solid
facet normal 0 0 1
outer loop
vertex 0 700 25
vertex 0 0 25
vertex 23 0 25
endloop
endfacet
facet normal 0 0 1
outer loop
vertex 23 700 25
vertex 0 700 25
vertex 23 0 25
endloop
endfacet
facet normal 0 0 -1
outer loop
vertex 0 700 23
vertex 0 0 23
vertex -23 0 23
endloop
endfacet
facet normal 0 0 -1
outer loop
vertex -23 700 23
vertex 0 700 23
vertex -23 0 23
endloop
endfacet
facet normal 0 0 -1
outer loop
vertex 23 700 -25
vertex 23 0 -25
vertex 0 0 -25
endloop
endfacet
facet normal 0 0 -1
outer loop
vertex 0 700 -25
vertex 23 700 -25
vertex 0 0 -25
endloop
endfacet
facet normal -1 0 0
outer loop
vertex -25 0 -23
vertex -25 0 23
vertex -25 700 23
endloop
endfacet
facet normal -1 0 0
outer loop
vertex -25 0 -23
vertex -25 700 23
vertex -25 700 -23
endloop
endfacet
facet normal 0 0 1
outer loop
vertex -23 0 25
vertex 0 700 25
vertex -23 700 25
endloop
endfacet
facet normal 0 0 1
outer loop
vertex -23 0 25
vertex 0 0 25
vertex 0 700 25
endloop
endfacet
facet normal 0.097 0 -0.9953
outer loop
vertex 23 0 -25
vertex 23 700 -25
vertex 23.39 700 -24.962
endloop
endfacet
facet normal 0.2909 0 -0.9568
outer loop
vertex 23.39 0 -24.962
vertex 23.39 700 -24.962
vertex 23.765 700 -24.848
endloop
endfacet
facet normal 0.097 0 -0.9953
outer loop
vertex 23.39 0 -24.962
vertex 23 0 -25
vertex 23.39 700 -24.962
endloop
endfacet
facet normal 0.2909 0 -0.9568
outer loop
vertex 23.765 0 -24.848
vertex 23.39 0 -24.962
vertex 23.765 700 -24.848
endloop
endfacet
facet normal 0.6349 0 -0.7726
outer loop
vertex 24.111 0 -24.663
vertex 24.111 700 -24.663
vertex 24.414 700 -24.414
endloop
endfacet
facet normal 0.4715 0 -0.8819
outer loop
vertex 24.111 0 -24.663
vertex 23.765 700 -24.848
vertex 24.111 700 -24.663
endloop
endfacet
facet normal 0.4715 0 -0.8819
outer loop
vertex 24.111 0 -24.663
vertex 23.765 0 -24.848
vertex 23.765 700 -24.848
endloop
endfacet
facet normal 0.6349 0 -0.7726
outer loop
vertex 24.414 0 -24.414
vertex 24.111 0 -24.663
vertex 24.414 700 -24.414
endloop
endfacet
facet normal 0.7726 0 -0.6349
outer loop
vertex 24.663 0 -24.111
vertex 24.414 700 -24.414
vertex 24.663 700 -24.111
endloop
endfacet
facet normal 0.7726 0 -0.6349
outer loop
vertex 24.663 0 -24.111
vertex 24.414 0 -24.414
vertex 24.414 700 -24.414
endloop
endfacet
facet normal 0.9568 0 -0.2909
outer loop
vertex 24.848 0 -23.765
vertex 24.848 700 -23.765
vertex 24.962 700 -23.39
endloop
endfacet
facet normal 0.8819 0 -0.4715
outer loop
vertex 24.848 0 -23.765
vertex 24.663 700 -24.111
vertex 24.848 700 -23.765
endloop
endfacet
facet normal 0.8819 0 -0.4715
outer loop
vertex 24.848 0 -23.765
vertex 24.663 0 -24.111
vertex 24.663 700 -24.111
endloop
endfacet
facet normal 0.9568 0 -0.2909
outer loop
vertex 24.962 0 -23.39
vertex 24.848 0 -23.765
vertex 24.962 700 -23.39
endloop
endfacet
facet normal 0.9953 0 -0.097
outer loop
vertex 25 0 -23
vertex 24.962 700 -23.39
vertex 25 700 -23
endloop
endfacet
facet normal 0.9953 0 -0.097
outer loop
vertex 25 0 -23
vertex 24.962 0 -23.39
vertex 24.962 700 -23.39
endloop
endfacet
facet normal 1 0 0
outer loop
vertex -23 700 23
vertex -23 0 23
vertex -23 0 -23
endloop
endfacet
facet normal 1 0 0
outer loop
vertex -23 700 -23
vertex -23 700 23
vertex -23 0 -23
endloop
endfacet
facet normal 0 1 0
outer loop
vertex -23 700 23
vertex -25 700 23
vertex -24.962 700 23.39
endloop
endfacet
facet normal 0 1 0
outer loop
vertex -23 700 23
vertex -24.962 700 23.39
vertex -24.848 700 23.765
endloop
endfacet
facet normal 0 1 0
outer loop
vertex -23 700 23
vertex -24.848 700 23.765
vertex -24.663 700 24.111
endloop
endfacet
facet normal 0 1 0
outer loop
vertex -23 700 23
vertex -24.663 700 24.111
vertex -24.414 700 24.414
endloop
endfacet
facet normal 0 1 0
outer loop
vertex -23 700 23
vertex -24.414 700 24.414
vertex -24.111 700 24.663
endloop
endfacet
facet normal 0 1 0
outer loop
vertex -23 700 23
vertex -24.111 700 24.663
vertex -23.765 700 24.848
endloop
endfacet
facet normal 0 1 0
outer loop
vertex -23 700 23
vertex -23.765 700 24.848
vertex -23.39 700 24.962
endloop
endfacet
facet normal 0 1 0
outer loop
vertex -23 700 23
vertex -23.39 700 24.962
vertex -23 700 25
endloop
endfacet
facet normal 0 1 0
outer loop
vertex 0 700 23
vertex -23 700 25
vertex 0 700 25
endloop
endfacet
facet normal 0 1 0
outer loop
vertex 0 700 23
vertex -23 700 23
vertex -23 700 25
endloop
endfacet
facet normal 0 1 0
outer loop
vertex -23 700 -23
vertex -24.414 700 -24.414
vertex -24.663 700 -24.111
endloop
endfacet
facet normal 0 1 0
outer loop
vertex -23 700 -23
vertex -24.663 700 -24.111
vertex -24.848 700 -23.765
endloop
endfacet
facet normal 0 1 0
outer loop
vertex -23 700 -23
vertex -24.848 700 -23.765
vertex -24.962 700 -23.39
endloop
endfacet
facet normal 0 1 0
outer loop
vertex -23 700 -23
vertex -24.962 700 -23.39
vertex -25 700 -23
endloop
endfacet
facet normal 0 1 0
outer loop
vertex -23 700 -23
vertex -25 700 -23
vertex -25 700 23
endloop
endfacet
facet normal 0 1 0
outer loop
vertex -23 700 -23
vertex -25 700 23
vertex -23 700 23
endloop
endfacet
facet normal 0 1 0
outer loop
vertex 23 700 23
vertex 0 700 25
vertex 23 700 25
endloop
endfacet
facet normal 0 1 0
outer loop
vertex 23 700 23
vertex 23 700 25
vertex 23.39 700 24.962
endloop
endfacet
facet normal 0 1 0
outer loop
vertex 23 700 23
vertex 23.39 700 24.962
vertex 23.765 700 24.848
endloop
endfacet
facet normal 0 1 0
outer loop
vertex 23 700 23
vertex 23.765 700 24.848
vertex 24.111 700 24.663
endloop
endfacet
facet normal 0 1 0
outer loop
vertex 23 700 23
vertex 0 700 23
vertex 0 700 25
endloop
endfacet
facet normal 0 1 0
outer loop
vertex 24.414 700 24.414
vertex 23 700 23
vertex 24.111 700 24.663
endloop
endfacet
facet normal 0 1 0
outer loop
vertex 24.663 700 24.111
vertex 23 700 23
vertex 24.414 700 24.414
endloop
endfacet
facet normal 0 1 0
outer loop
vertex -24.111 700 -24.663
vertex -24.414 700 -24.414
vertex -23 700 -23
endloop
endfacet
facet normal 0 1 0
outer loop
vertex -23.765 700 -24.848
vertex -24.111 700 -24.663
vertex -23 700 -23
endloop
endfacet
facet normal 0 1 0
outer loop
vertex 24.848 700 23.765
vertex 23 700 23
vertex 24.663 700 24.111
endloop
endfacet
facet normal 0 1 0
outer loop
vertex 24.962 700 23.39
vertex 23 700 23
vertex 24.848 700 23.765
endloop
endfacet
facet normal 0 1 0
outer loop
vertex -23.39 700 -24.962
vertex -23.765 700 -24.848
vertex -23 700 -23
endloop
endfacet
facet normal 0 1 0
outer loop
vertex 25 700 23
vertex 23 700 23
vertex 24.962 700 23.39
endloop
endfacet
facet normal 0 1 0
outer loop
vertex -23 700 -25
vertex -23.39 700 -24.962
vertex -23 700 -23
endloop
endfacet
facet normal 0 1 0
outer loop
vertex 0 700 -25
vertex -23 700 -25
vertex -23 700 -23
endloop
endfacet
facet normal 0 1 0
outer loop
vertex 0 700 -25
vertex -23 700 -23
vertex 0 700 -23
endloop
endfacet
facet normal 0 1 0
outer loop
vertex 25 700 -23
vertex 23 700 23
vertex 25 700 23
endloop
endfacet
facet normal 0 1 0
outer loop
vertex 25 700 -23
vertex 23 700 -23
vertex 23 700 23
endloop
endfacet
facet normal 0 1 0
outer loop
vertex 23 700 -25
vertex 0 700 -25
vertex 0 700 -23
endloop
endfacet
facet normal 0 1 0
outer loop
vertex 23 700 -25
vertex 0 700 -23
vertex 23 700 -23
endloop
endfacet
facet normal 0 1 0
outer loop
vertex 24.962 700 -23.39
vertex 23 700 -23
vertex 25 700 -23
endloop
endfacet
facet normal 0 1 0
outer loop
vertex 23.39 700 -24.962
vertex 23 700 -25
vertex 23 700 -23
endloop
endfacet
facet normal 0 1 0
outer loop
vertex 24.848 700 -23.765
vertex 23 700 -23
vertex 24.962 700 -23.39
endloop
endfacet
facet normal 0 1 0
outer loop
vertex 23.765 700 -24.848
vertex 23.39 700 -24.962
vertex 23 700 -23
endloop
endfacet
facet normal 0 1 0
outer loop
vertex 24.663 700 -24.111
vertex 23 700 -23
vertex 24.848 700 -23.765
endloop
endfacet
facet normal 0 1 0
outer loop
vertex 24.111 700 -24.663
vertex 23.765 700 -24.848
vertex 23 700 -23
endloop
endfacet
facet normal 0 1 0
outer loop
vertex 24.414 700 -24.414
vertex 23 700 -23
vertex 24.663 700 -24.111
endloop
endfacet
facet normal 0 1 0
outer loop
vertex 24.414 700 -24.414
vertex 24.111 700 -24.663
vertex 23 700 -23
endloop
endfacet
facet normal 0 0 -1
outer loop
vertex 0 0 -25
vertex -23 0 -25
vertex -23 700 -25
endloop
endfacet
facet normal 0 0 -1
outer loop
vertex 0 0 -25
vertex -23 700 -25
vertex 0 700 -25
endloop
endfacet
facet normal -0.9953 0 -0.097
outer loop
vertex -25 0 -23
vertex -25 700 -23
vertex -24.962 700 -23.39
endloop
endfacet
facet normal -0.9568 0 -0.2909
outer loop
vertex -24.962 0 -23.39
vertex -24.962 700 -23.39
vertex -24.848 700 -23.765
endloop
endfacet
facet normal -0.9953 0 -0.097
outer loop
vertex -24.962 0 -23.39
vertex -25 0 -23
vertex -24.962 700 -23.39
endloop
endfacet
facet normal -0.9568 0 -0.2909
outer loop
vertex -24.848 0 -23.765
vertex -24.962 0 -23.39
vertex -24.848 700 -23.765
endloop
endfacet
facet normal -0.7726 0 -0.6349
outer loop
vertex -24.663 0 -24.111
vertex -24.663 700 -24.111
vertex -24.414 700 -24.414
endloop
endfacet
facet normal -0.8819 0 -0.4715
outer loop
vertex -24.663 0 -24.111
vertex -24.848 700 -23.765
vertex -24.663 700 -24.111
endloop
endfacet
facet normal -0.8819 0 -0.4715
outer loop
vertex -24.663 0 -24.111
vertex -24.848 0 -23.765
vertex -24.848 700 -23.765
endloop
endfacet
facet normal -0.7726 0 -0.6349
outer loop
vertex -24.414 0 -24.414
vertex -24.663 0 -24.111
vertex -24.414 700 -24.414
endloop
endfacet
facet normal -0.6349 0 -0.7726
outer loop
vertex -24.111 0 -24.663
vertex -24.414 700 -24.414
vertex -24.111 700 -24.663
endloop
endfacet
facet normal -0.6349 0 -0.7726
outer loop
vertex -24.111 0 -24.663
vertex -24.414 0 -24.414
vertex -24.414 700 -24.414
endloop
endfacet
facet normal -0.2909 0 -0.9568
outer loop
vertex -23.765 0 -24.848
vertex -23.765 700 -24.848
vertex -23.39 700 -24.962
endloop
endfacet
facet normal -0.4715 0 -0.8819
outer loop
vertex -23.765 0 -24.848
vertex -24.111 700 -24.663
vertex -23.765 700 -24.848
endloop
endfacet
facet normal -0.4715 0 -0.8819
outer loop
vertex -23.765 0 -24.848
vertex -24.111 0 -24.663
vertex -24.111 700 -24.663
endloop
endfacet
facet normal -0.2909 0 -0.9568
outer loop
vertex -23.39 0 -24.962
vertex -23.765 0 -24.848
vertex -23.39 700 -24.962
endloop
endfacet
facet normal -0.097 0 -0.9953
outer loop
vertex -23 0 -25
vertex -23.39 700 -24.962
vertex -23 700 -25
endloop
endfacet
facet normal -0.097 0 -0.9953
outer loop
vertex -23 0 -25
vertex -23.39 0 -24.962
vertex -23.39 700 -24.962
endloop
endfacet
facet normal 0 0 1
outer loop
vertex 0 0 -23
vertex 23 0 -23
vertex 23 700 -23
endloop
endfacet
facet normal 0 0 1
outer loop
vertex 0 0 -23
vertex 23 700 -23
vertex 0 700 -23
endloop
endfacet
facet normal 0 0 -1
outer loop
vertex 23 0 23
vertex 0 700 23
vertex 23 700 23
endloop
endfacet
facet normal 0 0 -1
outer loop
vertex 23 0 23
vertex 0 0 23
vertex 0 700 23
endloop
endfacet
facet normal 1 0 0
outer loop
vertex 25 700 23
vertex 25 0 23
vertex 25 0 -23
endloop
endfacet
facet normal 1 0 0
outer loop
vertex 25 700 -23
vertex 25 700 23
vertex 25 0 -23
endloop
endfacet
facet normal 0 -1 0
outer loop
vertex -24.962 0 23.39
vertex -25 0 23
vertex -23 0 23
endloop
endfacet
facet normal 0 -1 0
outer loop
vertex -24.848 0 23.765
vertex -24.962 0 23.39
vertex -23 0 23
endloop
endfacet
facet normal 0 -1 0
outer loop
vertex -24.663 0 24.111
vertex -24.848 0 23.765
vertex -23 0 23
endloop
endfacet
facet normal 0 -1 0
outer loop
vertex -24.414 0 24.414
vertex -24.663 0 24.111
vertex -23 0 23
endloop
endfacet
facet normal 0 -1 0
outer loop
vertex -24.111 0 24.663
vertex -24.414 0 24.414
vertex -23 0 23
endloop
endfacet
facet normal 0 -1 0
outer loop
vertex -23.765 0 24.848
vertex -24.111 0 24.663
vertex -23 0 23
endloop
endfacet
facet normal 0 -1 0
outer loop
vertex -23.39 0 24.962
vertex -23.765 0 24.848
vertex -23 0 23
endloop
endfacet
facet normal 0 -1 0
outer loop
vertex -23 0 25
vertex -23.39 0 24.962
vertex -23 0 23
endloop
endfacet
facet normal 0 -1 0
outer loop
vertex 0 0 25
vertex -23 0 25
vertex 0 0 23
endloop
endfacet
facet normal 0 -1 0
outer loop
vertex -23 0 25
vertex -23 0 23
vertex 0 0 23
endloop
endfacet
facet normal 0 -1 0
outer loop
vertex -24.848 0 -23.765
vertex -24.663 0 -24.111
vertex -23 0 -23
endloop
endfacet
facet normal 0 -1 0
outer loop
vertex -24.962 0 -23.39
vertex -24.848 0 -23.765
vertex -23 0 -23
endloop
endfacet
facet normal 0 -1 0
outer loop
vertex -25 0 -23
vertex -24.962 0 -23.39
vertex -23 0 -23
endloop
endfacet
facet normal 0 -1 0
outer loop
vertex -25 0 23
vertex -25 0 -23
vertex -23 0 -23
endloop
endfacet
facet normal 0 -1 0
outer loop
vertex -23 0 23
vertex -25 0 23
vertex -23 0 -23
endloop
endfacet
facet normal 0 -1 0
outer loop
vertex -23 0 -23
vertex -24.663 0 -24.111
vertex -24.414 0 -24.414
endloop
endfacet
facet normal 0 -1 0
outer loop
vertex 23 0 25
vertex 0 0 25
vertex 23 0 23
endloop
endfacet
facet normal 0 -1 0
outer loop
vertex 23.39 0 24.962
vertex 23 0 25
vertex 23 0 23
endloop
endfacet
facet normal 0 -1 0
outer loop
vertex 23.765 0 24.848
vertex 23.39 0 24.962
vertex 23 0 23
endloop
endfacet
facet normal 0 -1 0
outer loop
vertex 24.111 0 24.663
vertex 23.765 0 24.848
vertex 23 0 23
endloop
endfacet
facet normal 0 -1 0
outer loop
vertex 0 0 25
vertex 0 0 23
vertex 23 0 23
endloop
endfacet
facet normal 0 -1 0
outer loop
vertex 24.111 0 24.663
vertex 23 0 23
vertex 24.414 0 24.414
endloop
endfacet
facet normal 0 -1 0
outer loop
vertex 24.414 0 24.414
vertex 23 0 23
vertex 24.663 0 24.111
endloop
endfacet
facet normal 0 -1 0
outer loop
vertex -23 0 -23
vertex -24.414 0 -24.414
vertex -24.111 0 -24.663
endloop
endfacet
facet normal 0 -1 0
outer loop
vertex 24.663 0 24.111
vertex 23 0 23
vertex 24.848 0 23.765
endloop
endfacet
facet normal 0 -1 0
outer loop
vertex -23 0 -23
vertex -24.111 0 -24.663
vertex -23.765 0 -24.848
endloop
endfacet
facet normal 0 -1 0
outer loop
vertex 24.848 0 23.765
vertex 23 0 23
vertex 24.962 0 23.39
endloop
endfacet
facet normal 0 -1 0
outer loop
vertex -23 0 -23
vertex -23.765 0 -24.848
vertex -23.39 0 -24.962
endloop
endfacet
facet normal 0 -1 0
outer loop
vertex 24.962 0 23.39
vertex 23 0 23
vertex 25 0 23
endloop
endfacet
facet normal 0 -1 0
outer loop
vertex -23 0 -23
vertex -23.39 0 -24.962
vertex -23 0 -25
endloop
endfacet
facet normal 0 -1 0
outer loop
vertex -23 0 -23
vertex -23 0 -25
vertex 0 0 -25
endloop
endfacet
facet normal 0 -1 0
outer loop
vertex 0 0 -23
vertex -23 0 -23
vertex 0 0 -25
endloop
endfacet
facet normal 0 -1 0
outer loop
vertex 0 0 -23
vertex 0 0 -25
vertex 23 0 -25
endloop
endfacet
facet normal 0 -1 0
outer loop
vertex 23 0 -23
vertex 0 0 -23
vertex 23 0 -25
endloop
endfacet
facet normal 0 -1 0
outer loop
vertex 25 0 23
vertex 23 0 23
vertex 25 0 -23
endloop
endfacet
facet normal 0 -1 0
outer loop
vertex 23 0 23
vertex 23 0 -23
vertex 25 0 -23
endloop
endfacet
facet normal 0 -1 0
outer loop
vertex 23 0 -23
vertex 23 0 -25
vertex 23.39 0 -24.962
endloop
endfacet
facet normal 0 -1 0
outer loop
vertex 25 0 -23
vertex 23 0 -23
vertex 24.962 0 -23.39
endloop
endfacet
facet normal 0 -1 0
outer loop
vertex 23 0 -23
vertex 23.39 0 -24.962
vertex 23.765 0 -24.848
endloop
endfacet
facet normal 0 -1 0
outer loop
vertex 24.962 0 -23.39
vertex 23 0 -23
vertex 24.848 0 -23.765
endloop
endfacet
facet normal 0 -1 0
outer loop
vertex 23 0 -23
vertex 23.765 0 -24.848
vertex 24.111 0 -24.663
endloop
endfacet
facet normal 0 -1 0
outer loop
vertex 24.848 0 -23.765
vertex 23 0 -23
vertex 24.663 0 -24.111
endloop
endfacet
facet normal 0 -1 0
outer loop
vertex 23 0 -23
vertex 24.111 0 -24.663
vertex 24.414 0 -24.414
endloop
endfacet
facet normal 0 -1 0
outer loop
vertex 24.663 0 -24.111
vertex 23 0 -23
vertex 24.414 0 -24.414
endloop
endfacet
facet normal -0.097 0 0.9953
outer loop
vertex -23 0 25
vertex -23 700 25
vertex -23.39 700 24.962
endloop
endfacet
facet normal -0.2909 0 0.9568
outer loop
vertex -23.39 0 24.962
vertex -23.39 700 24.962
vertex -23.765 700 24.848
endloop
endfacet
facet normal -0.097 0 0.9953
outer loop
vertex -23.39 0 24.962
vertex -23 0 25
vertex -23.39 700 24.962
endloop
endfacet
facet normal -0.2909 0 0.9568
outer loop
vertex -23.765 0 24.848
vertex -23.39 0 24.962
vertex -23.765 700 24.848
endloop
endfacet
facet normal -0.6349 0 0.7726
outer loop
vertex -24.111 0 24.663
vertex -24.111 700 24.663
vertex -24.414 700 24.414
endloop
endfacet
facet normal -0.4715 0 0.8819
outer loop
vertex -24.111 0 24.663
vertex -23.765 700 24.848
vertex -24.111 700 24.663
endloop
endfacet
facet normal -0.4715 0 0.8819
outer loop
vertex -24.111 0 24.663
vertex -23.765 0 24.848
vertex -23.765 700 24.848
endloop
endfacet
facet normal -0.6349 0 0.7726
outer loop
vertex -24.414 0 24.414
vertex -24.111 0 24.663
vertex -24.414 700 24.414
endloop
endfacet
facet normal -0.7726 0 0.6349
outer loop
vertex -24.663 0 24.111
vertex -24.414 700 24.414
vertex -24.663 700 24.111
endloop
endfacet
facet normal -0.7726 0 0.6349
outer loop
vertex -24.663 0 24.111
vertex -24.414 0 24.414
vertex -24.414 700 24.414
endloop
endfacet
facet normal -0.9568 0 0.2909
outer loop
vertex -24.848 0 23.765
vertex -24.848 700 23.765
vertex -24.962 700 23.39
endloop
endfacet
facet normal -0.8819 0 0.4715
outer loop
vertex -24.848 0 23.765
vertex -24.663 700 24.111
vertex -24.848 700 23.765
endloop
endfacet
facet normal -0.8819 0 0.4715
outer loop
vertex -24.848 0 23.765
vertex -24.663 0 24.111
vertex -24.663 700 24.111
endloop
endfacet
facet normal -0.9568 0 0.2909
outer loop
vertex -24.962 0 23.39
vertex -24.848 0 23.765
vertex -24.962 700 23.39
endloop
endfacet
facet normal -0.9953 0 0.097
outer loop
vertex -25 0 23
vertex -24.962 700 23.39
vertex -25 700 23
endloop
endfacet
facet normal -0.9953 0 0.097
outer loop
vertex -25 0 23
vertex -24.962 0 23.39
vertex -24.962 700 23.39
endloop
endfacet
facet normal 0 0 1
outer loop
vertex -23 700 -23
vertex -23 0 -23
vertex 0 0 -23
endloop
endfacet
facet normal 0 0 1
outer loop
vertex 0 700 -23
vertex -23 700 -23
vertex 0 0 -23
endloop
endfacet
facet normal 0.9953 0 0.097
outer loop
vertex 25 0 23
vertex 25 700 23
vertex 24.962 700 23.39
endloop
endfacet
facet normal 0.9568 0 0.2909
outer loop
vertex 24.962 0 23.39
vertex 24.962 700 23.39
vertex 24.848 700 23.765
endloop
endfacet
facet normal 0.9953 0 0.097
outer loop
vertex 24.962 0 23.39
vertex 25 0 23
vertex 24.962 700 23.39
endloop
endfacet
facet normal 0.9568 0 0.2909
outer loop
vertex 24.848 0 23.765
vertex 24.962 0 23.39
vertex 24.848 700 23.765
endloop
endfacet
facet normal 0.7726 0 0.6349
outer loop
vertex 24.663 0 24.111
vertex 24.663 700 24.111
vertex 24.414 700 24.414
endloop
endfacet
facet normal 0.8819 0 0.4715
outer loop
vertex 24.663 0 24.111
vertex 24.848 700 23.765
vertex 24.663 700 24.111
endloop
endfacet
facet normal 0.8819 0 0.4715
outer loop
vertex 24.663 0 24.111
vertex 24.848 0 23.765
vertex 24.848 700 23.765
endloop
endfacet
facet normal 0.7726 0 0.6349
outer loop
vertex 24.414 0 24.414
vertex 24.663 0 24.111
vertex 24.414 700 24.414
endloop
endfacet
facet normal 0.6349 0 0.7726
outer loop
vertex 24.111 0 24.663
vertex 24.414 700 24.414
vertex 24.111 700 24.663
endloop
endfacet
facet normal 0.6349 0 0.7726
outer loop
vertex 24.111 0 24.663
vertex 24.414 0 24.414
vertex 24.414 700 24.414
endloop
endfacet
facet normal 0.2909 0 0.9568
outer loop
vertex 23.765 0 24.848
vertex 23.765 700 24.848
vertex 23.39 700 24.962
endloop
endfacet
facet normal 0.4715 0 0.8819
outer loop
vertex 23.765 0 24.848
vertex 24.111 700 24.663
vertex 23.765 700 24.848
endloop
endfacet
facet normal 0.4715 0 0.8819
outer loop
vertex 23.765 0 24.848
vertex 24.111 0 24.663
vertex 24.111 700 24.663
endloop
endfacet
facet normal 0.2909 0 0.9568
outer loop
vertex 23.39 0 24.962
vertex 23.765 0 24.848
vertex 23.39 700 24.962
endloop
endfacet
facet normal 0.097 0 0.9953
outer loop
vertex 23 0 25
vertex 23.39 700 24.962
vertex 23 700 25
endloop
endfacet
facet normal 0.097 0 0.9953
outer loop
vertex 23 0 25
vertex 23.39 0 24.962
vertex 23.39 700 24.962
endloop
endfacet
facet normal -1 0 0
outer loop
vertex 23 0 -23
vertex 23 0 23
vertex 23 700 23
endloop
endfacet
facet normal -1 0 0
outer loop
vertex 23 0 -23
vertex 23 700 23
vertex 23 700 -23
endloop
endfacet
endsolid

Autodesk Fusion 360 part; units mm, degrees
sketch "Sketch1" plane through (0, 0, 0) normal (0, 1, 0) x (1, 0, 0)
  line L0 (0, -25) -> (23, -25)
  line L1 (25, -23) -> (25, 23)
  line L2 (23, 25) -> (0, 25)
  line L3 (0, -25) -> (-23, -25)
  line L4 (-25, -23) -> (-25, 23)
  line L5 (-23, 25) -> (0, 25)
  line L6 (0, -23) -> (-23, -23)
  line L7 (-23, -23) -> (-23, 23)
  line L8 (-23, 23) -> (0, 23)
  line L9 (23, 23) -> (0, 23)
  line L10 (23, -23) -> (23, 23)
  line L11 (0, -23) -> (23, -23)
  arc A0 (23, -25) -> (25, -23) centre (23, -23) ccw
  arc A1 (-25, -23) -> (-23, -25) centre (-23, -23) ccw
  arc A2 (-23, 25) -> (-25, 23) centre (-23, 23) ccw
  arc A3 (25, 23) -> (23, 25) centre (23, 23) ccw
  point P0 (25, -25)
  point P1 (25, 25)
  dimension "d1" = 25
  dimension "d2" = 25
  dimension "d3" = 50
  dimension "d4" = 2
  dimension "d7" = 2
  dimension "d8" = 2
  dimension "d9" = 2
  dimension "d10" = 2
extrude "Extrude1" add sketch "Sketch1" along normal blind 700
